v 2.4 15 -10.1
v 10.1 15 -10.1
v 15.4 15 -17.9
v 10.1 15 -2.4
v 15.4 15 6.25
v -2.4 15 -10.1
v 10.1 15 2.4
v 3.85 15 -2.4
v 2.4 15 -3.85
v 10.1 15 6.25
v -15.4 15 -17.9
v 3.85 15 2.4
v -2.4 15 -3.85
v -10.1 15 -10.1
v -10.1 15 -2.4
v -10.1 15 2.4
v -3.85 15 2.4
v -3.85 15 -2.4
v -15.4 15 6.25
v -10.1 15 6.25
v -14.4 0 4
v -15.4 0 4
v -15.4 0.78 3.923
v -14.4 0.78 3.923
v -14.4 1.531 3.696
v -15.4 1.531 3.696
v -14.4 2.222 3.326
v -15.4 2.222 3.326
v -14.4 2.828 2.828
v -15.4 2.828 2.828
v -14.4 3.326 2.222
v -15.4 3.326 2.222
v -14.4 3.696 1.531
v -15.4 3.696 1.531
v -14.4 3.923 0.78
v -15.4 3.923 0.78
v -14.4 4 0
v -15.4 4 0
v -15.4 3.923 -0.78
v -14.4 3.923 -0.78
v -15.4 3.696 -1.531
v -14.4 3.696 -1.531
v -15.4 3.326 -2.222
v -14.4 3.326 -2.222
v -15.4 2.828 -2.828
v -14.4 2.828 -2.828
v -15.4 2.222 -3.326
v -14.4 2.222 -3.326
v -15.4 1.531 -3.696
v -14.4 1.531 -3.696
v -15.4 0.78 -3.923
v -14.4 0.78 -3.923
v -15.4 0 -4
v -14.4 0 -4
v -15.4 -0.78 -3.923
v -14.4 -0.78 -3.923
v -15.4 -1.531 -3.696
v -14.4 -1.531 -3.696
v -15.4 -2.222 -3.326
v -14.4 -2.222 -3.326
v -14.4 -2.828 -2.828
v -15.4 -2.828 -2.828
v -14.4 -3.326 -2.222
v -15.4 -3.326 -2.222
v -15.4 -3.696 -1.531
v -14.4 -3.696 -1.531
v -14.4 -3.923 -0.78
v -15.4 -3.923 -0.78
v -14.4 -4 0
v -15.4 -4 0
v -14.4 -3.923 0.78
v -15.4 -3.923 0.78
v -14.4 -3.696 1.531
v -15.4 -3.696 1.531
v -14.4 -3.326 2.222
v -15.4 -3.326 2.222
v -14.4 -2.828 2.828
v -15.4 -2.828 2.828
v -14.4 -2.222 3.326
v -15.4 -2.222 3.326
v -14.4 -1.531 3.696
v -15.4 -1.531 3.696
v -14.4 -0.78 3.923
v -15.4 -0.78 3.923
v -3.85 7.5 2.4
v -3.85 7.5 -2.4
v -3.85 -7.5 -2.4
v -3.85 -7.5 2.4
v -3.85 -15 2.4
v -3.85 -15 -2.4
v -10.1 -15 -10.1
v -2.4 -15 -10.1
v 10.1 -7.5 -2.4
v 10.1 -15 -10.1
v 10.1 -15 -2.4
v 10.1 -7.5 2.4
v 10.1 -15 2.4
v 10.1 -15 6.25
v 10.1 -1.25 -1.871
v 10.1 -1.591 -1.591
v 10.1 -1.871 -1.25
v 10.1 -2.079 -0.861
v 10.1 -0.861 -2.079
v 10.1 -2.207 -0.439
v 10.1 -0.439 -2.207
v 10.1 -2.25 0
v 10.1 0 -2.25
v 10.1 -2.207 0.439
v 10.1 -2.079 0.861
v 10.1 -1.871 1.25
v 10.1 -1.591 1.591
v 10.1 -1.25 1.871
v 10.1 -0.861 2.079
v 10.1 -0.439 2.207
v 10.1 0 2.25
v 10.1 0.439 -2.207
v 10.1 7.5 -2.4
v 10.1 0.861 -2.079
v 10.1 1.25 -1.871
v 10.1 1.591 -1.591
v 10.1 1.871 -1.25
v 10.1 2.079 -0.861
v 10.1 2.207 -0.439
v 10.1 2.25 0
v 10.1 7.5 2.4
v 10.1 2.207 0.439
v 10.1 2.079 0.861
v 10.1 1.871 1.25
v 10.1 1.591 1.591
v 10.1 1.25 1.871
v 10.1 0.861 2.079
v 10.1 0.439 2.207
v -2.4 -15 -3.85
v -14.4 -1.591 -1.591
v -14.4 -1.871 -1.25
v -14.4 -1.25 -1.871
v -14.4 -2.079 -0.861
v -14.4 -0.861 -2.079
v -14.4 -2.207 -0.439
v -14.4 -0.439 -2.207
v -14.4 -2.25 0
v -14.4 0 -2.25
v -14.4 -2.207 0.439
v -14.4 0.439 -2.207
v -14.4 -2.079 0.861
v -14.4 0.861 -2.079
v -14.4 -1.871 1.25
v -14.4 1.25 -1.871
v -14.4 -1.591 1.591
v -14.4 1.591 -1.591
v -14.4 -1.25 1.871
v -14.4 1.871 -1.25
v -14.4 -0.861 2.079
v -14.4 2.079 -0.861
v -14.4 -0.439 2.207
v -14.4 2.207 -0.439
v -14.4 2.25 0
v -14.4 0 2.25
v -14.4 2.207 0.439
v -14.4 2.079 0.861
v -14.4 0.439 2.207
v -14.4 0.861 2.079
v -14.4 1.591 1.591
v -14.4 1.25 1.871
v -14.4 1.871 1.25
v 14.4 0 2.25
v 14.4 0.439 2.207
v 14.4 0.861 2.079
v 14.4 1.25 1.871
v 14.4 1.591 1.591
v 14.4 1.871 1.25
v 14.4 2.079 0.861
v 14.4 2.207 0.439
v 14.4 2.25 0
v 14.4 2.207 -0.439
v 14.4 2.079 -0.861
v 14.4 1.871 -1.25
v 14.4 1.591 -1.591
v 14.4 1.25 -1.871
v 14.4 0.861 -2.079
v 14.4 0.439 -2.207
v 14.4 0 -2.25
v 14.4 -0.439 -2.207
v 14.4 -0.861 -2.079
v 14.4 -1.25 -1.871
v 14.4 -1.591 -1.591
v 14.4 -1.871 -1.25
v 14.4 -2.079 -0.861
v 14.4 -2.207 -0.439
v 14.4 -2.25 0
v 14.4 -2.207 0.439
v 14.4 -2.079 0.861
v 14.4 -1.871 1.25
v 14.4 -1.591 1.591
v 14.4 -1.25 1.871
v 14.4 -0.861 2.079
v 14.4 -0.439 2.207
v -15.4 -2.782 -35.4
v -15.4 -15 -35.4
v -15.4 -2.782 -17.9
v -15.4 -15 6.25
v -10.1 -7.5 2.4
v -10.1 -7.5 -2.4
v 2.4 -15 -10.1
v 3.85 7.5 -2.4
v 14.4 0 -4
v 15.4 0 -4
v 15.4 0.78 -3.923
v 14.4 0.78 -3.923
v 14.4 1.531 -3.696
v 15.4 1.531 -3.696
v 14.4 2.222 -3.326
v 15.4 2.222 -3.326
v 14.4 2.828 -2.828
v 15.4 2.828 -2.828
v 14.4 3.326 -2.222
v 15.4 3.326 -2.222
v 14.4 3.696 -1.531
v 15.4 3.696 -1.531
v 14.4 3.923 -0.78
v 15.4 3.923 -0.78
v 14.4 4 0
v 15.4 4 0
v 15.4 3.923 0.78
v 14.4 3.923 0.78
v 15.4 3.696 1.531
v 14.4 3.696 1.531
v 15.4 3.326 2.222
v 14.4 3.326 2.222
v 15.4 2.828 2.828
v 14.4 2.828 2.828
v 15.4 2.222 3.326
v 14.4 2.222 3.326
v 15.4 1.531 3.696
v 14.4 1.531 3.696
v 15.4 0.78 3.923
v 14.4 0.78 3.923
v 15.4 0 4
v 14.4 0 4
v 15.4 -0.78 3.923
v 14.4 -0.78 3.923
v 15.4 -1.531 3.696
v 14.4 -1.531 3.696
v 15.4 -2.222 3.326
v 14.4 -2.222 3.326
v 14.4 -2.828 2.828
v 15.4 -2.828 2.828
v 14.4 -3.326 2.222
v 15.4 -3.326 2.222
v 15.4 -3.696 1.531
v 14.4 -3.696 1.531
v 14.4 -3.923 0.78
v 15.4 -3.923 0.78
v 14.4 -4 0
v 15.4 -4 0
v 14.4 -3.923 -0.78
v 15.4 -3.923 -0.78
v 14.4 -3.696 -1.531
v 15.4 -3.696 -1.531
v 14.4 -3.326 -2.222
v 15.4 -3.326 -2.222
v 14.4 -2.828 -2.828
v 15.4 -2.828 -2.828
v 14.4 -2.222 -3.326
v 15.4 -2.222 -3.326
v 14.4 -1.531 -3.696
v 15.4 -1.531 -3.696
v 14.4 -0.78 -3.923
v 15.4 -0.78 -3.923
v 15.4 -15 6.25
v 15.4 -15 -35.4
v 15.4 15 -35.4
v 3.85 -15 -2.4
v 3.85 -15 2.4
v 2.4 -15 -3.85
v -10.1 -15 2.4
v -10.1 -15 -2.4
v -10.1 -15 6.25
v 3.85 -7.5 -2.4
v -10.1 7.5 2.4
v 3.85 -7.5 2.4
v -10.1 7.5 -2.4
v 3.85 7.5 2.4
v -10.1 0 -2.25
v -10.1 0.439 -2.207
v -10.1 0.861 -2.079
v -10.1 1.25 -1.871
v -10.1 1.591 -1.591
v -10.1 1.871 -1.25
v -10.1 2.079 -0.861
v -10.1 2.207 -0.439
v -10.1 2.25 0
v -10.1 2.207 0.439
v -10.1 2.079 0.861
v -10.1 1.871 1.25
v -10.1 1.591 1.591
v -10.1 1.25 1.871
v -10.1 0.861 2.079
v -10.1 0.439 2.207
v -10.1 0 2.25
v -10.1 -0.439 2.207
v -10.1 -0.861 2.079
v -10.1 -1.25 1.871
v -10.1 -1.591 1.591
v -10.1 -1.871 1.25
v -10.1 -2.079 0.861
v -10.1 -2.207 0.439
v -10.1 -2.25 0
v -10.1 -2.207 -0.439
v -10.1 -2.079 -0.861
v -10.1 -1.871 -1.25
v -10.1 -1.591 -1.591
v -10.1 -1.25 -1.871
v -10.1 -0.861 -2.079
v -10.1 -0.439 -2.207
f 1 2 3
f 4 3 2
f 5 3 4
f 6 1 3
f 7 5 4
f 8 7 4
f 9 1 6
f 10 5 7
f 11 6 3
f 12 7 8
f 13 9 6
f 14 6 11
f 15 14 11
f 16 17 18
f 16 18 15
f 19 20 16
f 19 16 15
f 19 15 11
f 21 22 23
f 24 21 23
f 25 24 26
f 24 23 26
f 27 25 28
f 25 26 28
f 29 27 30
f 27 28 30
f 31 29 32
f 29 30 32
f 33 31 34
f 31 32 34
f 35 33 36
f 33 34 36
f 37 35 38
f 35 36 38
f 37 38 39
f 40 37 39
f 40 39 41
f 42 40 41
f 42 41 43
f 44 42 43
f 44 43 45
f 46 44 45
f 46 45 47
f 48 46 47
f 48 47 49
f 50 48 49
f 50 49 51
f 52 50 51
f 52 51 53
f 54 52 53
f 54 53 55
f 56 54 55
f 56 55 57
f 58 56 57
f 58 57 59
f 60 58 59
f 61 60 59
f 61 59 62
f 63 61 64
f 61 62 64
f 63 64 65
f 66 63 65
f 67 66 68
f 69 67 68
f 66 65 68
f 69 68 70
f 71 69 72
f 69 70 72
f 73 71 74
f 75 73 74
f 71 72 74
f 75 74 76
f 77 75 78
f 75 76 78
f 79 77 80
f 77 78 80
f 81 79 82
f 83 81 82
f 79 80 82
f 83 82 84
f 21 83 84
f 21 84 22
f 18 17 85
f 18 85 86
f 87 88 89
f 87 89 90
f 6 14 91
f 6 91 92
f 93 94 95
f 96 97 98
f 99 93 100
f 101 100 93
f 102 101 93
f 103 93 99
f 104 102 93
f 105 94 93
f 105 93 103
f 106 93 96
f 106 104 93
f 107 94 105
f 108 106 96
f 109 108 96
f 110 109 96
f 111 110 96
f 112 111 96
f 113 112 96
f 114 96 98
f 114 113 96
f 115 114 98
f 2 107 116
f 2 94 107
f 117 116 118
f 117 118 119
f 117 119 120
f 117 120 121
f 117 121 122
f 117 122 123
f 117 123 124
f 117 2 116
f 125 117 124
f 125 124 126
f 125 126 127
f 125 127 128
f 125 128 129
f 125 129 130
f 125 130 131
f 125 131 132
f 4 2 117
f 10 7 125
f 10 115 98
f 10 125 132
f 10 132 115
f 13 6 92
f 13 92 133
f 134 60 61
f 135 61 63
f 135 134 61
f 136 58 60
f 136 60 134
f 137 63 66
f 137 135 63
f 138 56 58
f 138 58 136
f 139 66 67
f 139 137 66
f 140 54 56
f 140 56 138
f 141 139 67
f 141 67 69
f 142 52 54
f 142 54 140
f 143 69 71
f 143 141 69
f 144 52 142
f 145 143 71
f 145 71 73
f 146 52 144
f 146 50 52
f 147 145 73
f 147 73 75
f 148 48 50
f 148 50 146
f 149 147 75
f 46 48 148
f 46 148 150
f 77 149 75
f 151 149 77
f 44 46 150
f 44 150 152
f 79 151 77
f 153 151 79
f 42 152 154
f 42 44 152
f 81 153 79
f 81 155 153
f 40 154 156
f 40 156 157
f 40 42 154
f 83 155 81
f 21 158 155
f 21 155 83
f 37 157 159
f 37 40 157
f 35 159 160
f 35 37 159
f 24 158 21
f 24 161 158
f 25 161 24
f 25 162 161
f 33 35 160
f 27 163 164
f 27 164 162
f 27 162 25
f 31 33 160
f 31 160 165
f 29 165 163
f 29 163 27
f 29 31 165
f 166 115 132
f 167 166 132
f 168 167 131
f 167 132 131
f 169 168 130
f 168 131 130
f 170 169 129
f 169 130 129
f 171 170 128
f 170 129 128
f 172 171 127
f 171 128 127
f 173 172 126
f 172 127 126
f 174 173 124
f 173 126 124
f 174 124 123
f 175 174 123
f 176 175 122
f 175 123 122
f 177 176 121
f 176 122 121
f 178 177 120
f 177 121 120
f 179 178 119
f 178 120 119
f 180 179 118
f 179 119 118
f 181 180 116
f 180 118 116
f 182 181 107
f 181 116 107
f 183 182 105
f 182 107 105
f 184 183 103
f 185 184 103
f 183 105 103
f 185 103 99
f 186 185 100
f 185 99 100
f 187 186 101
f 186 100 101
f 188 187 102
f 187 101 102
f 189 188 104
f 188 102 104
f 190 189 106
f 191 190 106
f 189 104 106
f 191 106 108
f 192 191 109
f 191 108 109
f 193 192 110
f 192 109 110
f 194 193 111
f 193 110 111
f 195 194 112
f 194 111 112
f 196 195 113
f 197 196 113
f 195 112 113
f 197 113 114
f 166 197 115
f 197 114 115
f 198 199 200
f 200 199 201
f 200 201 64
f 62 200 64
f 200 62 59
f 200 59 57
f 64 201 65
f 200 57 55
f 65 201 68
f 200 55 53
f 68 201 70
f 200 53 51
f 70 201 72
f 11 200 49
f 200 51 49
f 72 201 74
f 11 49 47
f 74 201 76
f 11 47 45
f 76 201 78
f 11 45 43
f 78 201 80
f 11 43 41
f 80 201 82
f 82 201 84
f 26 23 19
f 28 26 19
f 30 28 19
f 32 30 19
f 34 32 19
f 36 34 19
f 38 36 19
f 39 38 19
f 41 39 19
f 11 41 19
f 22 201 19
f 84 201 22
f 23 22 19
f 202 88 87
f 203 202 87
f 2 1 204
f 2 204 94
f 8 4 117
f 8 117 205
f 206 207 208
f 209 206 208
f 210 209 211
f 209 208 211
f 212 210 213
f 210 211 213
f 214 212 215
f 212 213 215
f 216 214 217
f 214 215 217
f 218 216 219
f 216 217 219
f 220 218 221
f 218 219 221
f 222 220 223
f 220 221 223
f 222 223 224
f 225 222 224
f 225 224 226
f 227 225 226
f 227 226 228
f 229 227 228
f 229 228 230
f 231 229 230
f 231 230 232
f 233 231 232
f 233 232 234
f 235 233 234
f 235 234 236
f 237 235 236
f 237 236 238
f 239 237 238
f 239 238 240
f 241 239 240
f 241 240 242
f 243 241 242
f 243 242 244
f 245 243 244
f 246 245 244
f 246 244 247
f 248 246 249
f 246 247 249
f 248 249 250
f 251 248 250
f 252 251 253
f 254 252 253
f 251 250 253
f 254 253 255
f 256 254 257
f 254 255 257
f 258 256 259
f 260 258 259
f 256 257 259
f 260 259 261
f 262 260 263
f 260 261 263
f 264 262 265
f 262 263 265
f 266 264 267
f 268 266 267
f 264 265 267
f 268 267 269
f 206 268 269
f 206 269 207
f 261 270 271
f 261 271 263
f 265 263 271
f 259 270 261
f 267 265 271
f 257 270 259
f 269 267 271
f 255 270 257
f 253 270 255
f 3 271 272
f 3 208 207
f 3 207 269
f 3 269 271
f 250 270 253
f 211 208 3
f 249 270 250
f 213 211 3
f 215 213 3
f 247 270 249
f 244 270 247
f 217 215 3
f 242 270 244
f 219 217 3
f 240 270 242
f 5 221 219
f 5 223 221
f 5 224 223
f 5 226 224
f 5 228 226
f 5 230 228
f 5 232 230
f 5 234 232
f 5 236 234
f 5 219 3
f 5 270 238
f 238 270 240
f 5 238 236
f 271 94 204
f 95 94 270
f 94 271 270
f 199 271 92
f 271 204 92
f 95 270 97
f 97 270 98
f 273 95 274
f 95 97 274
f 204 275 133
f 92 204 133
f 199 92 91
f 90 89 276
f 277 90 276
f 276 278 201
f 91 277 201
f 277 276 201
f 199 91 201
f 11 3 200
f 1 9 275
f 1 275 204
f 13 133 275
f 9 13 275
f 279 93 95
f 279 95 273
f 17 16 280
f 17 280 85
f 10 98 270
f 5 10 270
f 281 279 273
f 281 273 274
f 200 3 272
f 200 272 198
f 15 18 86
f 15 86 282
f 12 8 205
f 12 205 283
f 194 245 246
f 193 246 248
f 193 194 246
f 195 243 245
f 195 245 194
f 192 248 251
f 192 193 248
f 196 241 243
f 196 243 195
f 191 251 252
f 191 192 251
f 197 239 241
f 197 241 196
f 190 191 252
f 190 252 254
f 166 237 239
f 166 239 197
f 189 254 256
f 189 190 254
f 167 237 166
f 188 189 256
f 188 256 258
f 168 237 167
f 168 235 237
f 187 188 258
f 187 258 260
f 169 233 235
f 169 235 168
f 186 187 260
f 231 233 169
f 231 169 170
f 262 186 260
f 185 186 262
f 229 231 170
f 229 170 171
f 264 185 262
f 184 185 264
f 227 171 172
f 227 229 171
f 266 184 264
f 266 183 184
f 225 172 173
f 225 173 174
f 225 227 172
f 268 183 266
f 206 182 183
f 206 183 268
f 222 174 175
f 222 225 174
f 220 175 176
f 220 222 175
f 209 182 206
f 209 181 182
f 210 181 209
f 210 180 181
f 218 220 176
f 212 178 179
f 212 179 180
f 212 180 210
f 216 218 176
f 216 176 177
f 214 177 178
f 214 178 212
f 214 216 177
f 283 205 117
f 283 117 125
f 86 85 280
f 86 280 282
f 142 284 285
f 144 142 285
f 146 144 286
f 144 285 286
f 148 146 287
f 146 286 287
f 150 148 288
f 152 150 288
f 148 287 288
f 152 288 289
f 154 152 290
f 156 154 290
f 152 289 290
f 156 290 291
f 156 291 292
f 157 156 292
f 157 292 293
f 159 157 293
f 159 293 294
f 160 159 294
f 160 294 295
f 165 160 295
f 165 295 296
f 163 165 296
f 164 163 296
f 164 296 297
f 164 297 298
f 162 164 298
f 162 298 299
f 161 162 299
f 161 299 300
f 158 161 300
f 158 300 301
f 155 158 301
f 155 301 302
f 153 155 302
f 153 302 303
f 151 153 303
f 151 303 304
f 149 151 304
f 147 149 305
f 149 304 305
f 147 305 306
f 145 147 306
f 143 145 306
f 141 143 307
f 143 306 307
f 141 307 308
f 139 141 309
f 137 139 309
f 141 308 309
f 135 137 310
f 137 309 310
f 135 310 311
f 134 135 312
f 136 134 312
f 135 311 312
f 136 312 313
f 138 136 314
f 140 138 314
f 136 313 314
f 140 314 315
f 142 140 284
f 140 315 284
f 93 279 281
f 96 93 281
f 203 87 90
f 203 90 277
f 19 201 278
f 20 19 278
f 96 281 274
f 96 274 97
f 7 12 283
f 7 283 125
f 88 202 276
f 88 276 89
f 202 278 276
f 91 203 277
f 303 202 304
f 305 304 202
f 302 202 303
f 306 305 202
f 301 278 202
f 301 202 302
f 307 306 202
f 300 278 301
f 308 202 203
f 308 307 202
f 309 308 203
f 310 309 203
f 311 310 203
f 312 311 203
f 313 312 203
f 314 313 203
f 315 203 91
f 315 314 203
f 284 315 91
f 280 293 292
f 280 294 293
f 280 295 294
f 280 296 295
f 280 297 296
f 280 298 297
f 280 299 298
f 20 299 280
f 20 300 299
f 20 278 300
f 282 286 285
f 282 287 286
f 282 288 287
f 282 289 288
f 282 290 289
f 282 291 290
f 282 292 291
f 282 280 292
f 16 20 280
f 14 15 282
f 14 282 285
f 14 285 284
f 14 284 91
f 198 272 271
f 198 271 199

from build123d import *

# Parameters (mm, degrees)
BOSS_EXTRU_1_DEPTH                                = 15
ESQUISSE2_W                                       = 30.8
ESQUISSE2_H                                       = 30
BOSS_EXTRU_2_DEPTH                                = 20
ENL_V_MAT_EXTRU_2_DEPTH                           = 47.870913155
ENL_V_MAT_EXTRU_2_DEPTH_BACK                      = 17.5
ESQUISSE4_W                                       = 4.8
ESQUISSE4_H                                       = 15
ENL_V_MAT_EXTRU_3_DEPTH                           = 6.25
ESQUISSE5_W                                       = 4.8
ESQUISSE5_H                                       = 15
ENL_V_MAT_EXTRU_4_DEPTH                           = 6.25
CHAMBRAGE_POUR_VIS_SIX_PANS_CREUX_M41_D           = 4.5
CHAMBRAGE_POUR_VIS_SIX_PANS_CREUX_M41_DEPTH       = 5.3
CHAMBRAGE_POUR_VIS_SIX_PANS_CREUX_M41_CBORE_D     = 8
CHAMBRAGE_POUR_VIS_SIX_PANS_CREUX_M41_CBORE_DEPTH = 1
CHAMBRAGE_POUR_VIS_SIX_PANS_CREUX_M43_D           = 4.5
CHAMBRAGE_POUR_VIS_SIX_PANS_CREUX_M43_CBORE_D     = 8
CHAMBRAGE_POUR_VIS_SIX_PANS_CREUX_M43_CBORE_DEPTH = 1


with BuildPart() as part:
    # Base → Boss.-Extru.1 (new, symmetric)
    with BuildSketch(Plane(origin=(0, 0, 0), x_dir=(1, 0, 0), z_dir=(0, 1, 0))):
        Polygon((-3.85, -2.4), (-3.85, 2.4), (-10.1, 2.4), (-10.1, 10.1), (-2.4, 10.1), (-2.4, 3.85), (2.4, 3.85), (2.4, 10.1), (10.1, 10.1), (10.1, 2.4), (3.85, 2.4), (3.85, -2.4), (10.1, -2.4), (10.1, -6.25), (15.4, -6.25), (15.4, 15.4), (-15.4, 15.4), (-15.4, -6.25), (-10.1, -6.25), (-10.1, -2.4), align=None)
    extrude(amount=BOSS_EXTRU_1_DEPTH, both=True)

    # Esquisse2 → Boss.-Extru.2 (add)
    with BuildSketch(Plane(origin=(0, 0, -15.4), x_dir=(-1, 0, 0), z_dir=(0, 0, -1))):
        Rectangle(ESQUISSE2_W, ESQUISSE2_H)
    extrude(amount=BOSS_EXTRU_2_DEPTH)

    # Esquisse3 → Enlèv. mat.-Extru.2 (cut, two sides: drawn at the far end of the back side and taken through both)
    with BuildSketch(Plane(origin=(0, 0, -35.4), x_dir=(-1, 0, 0), z_dir=(0, 0, -1)).offset(-ENL_V_MAT_EXTRU_2_DEPTH_BACK)):
        Polygon((-98.531187965, 62.99581375), (-15.4, 15), (15.4, -2.782388291), (98.531187965, -50.778202041), (194.522815465, 115.484173889), (-2.539560466, 229.25818968), align=None)
    extrude(amount=ENL_V_MAT_EXTRU_2_DEPTH + ENL_V_MAT_EXTRU_2_DEPTH_BACK, mode=Mode.SUBTRACT)

    # Esquisse4 → Enlèv. mat.-Extru.3 (cut)
    with BuildSketch(Plane.ZY.offset(-3.85)):
        Rectangle(ESQUISSE4_W, ESQUISSE4_H)
    extrude(amount=-ENL_V_MAT_EXTRU_3_DEPTH, mode=Mode.SUBTRACT)

    # Esquisse5 → Enlèv. mat.-Extru.4 (cut)
    with BuildSketch(Plane(origin=(-3.85, 0, 0), x_dir=(0, 0, -1), z_dir=(1, 0, 0))):
        Rectangle(ESQUISSE5_W, ESQUISSE5_H)
    extrude(amount=-ENL_V_MAT_EXTRU_4_DEPTH, mode=Mode.SUBTRACT)

    # Chambrage pour vis à six pans creux M41
    with Locations(Plane(origin=(15.4, 0, 0), x_dir=(0, 0, -1), z_dir=(1, 0, 0))):
        with Locations((0, 0)):
            CounterBoreHole(CHAMBRAGE_POUR_VIS_SIX_PANS_CREUX_M41_D / 2, CHAMBRAGE_POUR_VIS_SIX_PANS_CREUX_M41_CBORE_D / 2, CHAMBRAGE_POUR_VIS_SIX_PANS_CREUX_M41_CBORE_DEPTH, depth=CHAMBRAGE_POUR_VIS_SIX_PANS_CREUX_M41_DEPTH)

    # Chambrage pour vis à six pans creux M43 (through all)
    with Locations(Plane.ZY.offset(15.4)):
        with Locations((0, 0)):
            CounterBoreHole(CHAMBRAGE_POUR_VIS_SIX_PANS_CREUX_M43_D / 2, CHAMBRAGE_POUR_VIS_SIX_PANS_CREUX_M43_CBORE_D / 2, CHAMBRAGE_POUR_VIS_SIX_PANS_CREUX_M43_CBORE_DEPTH)


solid = part.part
